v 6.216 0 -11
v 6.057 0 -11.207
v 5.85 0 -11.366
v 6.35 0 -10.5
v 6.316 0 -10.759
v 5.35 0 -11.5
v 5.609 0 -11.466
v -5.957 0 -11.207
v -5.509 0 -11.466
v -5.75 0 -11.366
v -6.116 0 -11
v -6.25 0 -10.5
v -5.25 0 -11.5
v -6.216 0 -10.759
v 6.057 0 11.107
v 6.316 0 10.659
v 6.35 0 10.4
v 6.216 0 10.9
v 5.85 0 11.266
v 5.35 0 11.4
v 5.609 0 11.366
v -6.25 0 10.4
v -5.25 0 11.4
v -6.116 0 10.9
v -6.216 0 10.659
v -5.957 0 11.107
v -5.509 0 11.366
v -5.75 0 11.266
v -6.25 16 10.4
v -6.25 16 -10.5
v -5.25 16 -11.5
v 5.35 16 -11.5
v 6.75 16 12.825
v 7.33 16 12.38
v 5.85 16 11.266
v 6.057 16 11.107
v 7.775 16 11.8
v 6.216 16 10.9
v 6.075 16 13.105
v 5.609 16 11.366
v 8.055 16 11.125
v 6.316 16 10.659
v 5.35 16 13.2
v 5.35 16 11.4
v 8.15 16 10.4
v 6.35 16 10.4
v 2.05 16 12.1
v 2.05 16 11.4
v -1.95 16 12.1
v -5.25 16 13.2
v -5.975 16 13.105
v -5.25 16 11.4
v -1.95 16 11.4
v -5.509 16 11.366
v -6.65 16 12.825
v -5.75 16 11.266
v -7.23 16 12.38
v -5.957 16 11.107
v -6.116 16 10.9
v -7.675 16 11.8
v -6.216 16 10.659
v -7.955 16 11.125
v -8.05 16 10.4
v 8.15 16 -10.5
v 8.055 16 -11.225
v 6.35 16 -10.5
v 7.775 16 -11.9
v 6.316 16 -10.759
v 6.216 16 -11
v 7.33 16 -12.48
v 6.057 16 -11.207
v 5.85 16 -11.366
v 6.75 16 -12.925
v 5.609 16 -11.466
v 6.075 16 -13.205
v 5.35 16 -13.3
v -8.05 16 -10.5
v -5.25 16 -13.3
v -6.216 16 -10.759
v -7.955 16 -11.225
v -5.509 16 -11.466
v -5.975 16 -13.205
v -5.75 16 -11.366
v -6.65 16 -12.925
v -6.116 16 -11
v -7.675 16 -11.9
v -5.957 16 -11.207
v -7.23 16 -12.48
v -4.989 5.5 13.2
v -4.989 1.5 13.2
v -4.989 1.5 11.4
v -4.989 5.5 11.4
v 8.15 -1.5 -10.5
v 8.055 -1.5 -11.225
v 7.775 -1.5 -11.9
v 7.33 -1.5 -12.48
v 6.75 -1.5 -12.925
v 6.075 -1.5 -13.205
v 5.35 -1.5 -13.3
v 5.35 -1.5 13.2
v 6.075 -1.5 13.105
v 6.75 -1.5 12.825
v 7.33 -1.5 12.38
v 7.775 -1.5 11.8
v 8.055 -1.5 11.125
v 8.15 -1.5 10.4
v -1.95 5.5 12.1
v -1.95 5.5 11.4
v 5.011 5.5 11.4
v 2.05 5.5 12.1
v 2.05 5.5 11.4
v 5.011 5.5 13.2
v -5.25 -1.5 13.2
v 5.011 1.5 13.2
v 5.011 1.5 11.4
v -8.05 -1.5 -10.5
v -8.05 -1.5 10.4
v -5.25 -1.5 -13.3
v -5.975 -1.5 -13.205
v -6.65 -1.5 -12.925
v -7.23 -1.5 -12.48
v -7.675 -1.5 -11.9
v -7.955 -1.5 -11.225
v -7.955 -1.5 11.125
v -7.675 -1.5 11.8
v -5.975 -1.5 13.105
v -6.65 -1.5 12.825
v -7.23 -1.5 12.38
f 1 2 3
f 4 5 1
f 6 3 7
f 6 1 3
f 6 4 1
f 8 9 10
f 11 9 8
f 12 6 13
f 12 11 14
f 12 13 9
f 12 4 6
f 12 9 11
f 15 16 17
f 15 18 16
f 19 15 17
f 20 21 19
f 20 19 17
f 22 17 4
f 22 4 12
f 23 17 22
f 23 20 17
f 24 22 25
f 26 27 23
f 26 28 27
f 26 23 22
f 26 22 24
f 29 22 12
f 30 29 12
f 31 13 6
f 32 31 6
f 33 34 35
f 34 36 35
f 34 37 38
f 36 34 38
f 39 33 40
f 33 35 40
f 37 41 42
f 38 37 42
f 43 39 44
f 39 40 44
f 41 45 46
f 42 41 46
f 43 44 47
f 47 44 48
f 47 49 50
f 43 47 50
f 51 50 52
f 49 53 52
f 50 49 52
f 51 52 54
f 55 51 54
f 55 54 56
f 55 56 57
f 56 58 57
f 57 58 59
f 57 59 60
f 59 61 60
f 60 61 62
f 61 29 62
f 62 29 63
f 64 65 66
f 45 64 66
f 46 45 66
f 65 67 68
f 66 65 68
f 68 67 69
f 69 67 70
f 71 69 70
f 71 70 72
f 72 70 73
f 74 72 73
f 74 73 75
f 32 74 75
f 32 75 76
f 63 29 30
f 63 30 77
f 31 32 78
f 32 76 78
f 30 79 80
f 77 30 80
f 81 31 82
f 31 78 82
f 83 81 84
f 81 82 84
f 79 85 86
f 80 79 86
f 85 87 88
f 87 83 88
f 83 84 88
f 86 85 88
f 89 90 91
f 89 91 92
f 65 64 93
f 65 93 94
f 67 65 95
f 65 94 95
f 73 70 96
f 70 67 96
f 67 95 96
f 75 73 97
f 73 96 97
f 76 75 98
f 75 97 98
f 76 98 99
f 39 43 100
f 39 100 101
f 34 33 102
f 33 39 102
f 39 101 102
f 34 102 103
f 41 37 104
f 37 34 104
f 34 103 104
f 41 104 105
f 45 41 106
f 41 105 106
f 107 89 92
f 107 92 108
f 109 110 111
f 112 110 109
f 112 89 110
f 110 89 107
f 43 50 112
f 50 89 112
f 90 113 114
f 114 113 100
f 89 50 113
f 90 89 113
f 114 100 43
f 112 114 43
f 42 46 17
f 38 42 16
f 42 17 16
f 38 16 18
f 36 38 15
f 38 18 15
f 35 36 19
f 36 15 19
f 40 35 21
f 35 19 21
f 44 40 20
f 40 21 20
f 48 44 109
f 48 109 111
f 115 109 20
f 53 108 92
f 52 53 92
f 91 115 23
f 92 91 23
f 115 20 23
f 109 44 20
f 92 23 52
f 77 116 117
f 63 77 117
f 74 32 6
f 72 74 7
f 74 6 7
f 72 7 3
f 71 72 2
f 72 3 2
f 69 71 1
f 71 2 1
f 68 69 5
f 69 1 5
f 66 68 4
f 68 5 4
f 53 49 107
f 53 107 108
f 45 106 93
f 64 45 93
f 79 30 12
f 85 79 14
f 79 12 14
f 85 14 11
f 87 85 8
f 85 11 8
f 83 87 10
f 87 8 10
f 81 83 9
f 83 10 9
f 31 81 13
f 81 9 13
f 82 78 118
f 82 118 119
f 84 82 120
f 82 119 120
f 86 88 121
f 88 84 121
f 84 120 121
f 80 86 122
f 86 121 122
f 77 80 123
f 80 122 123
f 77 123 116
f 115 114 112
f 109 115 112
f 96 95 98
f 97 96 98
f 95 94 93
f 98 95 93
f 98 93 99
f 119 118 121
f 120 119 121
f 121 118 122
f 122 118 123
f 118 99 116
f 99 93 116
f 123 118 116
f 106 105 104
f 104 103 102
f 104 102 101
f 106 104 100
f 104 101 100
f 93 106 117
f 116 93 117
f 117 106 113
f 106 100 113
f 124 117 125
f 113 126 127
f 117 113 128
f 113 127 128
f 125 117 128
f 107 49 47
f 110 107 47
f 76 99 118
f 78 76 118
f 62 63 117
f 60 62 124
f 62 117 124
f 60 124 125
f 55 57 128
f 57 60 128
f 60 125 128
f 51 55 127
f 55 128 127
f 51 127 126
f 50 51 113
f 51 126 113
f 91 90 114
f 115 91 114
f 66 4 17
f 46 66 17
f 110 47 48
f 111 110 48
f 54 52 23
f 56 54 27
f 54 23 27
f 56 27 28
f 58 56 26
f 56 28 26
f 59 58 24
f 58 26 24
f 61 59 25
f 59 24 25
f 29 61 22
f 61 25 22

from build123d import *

# Parameters (mm, degrees)
BOSS_EXTRUDE1_DEPTH = 16
BOSS_EXTRUDE2_START = 1.5
BOSS_EXTRUDE2_DEPTH = 1.5
SKETCH3_W           = 10
SKETCH3_H           = 4
CUT_EXTRUDE1_DEPTH  = 2.5
SKETCH5_W           = 4
SKETCH5_H           = 1.4
CUT_EXTRUDE2_DEPTH  = 14


with BuildPart() as part:
    # Sketch1 → Boss-Extrude1 (new body)
    with BuildSketch(Plane(origin=(0, 0, 0), x_dir=(1, 0, 0), z_dir=(0, 1, 0))):
        with BuildLine():
            Line((-5.25, 13.3), (5.35, 13.3))
            ThreePointArc((5.35, 13.3), (7.329898987, 12.479898987), (8.15, 10.5))
            Line((8.15, 10.5), (8.15, -10.4))
            ThreePointArc((8.15, -10.4), (7.329898987, -12.379898987), (5.35, -13.2))
            Line((5.35, -13.2), (-5.25, -13.2))
            ThreePointArc((-5.25, -13.2), (-7.229898987, -12.379898987), (-8.05, -10.4))
            Line((-8.05, -10.4), (-8.05, 10.5))
            ThreePointArc((-8.05, 10.5), (-7.229898987, 12.479898987), (-5.25, 13.3))
        make_face()
        with BuildLine():
            Line((-5.25, 11.5), (5.35, 11.5))
            ThreePointArc((5.35, 11.5), (6.057106781, 11.207106781), (6.35, 10.5))
            Line((6.35, 10.5), (6.35, -10.4))
            ThreePointArc((6.35, -10.4), (6.057106781, -11.107106781), (5.35, -11.4))
            Line((5.35, -11.4), (-5.25, -11.4))
            ThreePointArc((-5.25, -11.4), (-5.957106781, -11.107106781), (-6.25, -10.4))
            Line((-6.25, -10.4), (-6.25, 10.5))
            ThreePointArc((-6.25, 10.5), (-5.957106781, 11.207106781), (-5.25, 11.5))
        make_face(mode=Mode.SUBTRACT)
    extrude(amount=BOSS_EXTRUDE1_DEPTH)

    # Sketch2 → Boss-Extrude2 (add)
    with BuildSketch(Plane.XZ.offset(BOSS_EXTRUDE2_START)):
        with BuildLine():
            Line((-5.25, 13.2), (5.35, 13.2))
            ThreePointArc((5.35, 13.2), (7.329898987, 12.379898987), (8.15, 10.4))
            Line((8.15, 10.4), (8.15, -10.5))
            ThreePointArc((8.15, -10.5), (7.329898987, -12.479898987), (5.35, -13.3))
            Line((5.35, -13.3), (-5.25, -13.3))
            ThreePointArc((-5.25, -13.3), (-7.229898987, -12.479898987), (-8.05, -10.5))
            Line((-8.05, -10.5), (-8.05, 10.4))
            ThreePointArc((-8.05, 10.4), (-7.229898987, 12.379898987), (-5.25, 13.2))
        make_face()
    extrude(amount=-BOSS_EXTRUDE2_DEPTH)

    # Sketch3 → Cut-Extrude1 (cut)
    with BuildSketch(Plane.XY.offset(13.2)):
        with Locations((0.0109375, 3.5)):
            Rectangle(SKETCH3_W, SKETCH3_H)
    extrude(amount=-CUT_EXTRUDE1_DEPTH, mode=Mode.SUBTRACT)

    # Sketch5 → Cut-Extrude2 (cut)
    with BuildSketch(Plane(origin=(0, 16, 0), x_dir=(1, 0, 0), z_dir=(0, 1, 0))):
        with Locations((0.05, -11.4)):
            Rectangle(SKETCH5_W, SKETCH5_H)
    extrude(amount=-CUT_EXTRUDE2_DEPTH, mode=Mode.SUBTRACT)


solid = part.part
